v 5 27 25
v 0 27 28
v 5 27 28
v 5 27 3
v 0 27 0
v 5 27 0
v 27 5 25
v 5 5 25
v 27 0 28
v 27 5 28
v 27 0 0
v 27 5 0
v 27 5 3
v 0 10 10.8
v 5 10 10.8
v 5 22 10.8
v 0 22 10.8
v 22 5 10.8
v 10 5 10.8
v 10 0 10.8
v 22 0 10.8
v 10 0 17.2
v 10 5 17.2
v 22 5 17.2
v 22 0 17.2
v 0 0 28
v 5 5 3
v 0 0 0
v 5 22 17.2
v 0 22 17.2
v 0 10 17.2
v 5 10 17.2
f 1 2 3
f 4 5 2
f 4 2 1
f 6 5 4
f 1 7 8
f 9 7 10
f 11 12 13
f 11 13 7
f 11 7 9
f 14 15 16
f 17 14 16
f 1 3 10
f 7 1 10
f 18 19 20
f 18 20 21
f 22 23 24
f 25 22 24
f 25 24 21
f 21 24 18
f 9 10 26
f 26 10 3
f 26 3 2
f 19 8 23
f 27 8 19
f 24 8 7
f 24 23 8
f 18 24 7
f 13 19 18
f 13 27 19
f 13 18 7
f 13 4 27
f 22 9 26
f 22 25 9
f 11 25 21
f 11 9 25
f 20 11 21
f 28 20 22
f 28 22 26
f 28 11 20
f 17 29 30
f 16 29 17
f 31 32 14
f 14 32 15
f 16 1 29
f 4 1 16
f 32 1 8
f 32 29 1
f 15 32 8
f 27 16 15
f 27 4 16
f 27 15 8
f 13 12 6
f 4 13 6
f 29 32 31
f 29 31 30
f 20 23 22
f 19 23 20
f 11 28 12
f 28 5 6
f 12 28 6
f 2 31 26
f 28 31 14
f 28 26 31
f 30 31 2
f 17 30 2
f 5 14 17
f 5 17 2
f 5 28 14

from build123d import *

# Parameters (mm, degrees)
BOSS_EXTRUDE1_DEPTH = 28
BOSS_EXTRUDE2_DEPTH = 3
BOSS_EXTRUDE3_DEPTH = 3
SKETCH4_W           = 6.4
SKETCH4_H           = 12
CUT_EXTRUDE1_DEPTH  = 5
SKETCH5_W           = 12
SKETCH5_H           = 6.4
CUT_EXTRUDE2_DEPTH  = 5


with BuildPart() as part:
    # Sketch1 → Boss-Extrude1 (new body)
    with BuildSketch(Plane.XY):
        Polygon((5, 5), (5, 27), (0, 27), (0, 0), (27, 0), (27, 5), align=None)
    extrude(amount=BOSS_EXTRUDE1_DEPTH)

    # Sketch1<3> → Boss-Extrude2 (add)
    with BuildSketch(Plane.XY):
        Polygon((27, 5), (5, 27), (5, 5), align=None)
    extrude(amount=BOSS_EXTRUDE2_DEPTH)

    # Sketch3 → Boss-Extrude3 (add)
    with BuildSketch(Plane.XY.offset(28)):
        Polygon((5, 27), (27, 5), (5, 5), align=None)
    extrude(amount=-BOSS_EXTRUDE3_DEPTH)

    # Sketch4 → Cut-Extrude1 (cut)
    with BuildSketch(Plane(origin=(5, 0, 0), x_dir=(0, 0, -1), z_dir=(1, 0, 0))):
        with Locations((-14, 16)):
            Rectangle(SKETCH4_W, SKETCH4_H)
    extrude(amount=-CUT_EXTRUDE1_DEPTH, mode=Mode.SUBTRACT)

    # Sketch5 → Cut-Extrude2 (cut)
    with BuildSketch(Plane(origin=(0, 5, 0), x_dir=(1, 0, 0), z_dir=(0, 1, 0))):
        with Locations((16, -14)):
            Rectangle(SKETCH5_W, SKETCH5_H)
    extrude(amount=-CUT_EXTRUDE2_DEPTH, mode=Mode.SUBTRACT)


solid = part.part
